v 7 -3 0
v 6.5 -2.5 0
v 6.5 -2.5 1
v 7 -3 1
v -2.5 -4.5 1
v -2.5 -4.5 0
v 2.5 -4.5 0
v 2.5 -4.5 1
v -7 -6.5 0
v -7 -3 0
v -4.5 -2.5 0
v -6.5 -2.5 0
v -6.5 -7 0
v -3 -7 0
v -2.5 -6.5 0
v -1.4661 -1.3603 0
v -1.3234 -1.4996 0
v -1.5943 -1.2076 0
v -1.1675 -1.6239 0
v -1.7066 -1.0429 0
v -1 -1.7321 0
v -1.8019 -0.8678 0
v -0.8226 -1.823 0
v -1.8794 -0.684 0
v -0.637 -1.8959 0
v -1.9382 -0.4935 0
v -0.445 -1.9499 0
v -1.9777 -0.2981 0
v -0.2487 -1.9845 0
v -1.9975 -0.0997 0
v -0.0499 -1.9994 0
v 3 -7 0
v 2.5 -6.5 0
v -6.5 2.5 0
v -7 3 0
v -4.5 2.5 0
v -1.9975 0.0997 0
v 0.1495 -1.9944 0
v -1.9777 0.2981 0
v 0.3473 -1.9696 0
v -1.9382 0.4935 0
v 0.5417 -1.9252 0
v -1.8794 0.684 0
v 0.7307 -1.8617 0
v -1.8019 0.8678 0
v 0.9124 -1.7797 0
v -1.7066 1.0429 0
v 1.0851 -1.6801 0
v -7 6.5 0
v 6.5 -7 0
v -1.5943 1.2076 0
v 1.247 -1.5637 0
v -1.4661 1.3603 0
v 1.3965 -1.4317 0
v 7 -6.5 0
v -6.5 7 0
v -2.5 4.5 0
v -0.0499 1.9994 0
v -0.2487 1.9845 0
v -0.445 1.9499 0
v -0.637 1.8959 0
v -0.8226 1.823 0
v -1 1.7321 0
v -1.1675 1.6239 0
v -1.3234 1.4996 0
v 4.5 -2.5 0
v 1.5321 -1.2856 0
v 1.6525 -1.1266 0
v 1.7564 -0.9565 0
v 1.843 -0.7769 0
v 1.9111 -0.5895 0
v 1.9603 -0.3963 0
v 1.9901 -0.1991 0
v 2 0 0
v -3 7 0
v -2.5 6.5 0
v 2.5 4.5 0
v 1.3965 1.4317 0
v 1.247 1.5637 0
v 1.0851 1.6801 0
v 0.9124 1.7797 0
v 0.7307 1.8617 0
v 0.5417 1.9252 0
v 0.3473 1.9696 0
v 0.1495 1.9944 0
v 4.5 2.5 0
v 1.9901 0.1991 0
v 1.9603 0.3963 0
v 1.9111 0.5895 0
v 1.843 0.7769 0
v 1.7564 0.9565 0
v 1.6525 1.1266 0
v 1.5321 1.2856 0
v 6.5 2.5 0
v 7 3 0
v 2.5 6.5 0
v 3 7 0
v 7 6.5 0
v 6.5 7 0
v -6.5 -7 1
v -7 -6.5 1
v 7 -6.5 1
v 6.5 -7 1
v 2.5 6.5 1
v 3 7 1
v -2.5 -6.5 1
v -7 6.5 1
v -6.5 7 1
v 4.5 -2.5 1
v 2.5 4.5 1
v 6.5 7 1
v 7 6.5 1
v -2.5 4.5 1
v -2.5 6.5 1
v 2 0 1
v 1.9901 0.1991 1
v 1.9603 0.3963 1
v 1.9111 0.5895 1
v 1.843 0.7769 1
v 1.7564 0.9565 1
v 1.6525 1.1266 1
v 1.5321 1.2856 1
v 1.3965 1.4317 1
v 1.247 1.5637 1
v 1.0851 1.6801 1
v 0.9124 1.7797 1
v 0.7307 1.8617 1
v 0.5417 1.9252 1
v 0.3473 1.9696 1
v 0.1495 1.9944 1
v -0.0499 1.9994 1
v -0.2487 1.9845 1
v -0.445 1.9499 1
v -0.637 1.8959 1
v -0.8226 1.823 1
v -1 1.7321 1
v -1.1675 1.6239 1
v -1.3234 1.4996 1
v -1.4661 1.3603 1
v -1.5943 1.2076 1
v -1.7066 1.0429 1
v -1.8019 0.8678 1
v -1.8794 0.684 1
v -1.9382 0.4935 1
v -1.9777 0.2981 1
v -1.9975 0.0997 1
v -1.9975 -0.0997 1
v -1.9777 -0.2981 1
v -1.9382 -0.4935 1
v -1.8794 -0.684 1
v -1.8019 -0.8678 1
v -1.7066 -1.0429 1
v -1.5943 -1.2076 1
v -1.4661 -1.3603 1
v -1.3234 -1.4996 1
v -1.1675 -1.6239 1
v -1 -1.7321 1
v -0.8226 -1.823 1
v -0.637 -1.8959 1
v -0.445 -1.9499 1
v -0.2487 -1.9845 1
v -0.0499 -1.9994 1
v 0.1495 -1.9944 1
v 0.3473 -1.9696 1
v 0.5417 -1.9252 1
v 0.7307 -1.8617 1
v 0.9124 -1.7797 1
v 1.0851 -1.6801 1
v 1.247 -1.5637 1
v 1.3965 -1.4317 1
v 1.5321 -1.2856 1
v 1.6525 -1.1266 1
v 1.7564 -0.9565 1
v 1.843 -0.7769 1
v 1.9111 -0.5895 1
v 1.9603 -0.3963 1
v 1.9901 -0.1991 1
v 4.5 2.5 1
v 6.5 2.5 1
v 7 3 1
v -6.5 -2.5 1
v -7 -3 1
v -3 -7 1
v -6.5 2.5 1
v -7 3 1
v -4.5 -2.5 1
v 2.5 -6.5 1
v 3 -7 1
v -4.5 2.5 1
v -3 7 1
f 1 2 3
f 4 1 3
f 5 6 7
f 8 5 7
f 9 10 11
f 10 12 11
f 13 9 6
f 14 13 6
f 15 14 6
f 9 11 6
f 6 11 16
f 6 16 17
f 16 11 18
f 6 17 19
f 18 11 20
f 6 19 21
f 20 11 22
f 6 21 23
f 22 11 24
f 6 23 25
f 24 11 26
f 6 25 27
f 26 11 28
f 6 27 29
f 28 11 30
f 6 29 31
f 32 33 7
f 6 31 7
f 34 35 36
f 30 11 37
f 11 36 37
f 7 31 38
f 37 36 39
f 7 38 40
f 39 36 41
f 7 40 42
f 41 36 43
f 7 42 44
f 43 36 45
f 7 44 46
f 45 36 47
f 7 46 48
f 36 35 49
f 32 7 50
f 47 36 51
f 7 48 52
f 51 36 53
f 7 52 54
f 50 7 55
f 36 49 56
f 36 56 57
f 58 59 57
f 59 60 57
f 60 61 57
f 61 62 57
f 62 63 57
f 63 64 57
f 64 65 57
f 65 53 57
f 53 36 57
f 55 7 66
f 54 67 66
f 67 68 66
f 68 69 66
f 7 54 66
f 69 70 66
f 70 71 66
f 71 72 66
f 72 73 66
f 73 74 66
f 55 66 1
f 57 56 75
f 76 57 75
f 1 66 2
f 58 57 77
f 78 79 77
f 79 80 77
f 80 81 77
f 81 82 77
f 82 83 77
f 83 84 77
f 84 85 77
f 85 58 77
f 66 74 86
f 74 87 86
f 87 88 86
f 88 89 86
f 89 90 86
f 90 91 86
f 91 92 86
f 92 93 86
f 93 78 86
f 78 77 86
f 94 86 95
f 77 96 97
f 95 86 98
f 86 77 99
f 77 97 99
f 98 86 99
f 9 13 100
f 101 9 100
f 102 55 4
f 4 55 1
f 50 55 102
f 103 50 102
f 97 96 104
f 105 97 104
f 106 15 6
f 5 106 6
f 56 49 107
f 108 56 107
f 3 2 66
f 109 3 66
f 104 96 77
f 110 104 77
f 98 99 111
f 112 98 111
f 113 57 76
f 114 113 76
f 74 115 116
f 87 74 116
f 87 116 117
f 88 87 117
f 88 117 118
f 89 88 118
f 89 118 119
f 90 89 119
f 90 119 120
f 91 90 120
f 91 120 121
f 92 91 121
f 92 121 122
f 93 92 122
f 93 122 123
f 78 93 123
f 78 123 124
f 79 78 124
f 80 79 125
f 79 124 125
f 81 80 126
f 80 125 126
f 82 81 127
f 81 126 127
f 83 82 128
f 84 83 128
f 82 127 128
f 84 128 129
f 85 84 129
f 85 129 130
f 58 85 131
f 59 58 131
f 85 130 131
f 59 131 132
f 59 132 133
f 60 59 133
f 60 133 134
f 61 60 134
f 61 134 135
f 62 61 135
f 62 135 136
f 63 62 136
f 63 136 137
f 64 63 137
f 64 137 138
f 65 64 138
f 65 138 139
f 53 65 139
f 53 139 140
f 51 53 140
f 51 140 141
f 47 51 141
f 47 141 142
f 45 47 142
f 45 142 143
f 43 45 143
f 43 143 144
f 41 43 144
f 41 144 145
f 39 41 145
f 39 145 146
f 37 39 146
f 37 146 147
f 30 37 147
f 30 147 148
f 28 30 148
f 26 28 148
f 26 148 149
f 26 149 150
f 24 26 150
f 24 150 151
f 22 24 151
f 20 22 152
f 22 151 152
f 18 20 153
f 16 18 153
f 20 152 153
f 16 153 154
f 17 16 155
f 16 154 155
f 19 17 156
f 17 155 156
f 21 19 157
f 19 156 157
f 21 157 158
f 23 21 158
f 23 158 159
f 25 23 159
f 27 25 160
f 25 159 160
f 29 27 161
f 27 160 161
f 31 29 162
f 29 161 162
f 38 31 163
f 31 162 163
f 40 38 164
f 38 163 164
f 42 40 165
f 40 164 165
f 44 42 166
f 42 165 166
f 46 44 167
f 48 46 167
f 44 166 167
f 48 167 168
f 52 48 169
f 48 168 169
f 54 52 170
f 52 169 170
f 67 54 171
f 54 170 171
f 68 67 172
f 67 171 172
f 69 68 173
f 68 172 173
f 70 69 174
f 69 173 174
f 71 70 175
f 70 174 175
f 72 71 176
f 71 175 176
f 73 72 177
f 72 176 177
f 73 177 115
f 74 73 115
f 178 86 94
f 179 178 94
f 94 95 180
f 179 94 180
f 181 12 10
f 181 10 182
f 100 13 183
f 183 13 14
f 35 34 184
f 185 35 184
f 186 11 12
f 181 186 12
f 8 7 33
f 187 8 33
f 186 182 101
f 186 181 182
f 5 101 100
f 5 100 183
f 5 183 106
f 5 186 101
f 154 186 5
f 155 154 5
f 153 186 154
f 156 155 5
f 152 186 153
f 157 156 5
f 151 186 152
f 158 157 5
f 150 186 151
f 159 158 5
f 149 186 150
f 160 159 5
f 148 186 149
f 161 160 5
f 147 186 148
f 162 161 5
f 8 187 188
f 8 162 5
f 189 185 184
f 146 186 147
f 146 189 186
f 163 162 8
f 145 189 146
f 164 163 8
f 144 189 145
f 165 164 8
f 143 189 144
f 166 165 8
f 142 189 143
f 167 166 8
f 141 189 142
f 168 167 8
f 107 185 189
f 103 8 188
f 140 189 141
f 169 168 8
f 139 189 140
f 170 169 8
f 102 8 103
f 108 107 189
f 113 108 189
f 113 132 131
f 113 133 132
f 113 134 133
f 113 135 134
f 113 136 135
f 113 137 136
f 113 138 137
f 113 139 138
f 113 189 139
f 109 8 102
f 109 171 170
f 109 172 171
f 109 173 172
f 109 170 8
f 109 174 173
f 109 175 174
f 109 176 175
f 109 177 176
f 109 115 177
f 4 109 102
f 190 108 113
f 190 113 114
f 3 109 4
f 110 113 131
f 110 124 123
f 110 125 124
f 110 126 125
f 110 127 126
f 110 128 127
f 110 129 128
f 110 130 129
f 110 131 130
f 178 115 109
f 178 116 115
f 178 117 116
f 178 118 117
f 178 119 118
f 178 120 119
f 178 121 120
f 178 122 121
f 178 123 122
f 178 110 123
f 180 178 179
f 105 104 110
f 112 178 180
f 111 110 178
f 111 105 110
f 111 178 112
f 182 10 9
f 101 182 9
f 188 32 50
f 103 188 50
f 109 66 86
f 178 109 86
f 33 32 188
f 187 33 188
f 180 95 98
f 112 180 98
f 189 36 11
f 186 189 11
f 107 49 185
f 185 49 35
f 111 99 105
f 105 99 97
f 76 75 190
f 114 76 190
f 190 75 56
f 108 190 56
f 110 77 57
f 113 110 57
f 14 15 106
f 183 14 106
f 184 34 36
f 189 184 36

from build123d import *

# Parameters (mm, degrees)
F1_DEPTH = 1
F2_SIZE  = 0.5
F3_R     = 2
F4_DEPTH = 25


with BuildPart() as f1:
    # F0 (on Top) → F1 (new body)
    with BuildSketch(Plane.XY):
        Polygon((-7, -2.5), (-7, -7), (-2.5, -7), (-2.5, -4.5), (2.5, -4.5), (2.5, -7), (7, -7), (7, -2.5), (4.5, -2.5), (4.5, 2.5), (7, 2.5), (7, 7), (2.5, 7), (2.5, 4.5), (-2.5, 4.5), (-2.5, 7), (-7, 7), (-7, 2.5), (-4.5, 2.5), (-4.5, -2.5), align=None)
    extrude(amount=F1_DEPTH)

    # F2
    f2_edges = [f1.edges().sort_by_distance(p)[0] for p in [
        (-7, -7, 0.5),
        (-2.5, -7, 0.5),
        (-7, -2.5, 0.5),
        (-7, 2.5, 0.5),
        (-7, 7, 0.5),
        (-2.5, 7, 0.5),
        (2.5, 7, 0.5),
        (7, 7, 0.5),
        (7, -2.5, 0.5),
        (7, -7, 0.5),
        (2.5, -7, 0.5),
        (7, 2.5, 0.5),
    ]]
    chamfer(f2_edges, length=F2_SIZE)

    # F3 (on face) → F4 (cut)
    with BuildSketch(Plane.XY.offset(1)):
        Circle(F3_R)
    extrude(amount=-F4_DEPTH, mode=Mode.SUBTRACT)


solid = f1.part
